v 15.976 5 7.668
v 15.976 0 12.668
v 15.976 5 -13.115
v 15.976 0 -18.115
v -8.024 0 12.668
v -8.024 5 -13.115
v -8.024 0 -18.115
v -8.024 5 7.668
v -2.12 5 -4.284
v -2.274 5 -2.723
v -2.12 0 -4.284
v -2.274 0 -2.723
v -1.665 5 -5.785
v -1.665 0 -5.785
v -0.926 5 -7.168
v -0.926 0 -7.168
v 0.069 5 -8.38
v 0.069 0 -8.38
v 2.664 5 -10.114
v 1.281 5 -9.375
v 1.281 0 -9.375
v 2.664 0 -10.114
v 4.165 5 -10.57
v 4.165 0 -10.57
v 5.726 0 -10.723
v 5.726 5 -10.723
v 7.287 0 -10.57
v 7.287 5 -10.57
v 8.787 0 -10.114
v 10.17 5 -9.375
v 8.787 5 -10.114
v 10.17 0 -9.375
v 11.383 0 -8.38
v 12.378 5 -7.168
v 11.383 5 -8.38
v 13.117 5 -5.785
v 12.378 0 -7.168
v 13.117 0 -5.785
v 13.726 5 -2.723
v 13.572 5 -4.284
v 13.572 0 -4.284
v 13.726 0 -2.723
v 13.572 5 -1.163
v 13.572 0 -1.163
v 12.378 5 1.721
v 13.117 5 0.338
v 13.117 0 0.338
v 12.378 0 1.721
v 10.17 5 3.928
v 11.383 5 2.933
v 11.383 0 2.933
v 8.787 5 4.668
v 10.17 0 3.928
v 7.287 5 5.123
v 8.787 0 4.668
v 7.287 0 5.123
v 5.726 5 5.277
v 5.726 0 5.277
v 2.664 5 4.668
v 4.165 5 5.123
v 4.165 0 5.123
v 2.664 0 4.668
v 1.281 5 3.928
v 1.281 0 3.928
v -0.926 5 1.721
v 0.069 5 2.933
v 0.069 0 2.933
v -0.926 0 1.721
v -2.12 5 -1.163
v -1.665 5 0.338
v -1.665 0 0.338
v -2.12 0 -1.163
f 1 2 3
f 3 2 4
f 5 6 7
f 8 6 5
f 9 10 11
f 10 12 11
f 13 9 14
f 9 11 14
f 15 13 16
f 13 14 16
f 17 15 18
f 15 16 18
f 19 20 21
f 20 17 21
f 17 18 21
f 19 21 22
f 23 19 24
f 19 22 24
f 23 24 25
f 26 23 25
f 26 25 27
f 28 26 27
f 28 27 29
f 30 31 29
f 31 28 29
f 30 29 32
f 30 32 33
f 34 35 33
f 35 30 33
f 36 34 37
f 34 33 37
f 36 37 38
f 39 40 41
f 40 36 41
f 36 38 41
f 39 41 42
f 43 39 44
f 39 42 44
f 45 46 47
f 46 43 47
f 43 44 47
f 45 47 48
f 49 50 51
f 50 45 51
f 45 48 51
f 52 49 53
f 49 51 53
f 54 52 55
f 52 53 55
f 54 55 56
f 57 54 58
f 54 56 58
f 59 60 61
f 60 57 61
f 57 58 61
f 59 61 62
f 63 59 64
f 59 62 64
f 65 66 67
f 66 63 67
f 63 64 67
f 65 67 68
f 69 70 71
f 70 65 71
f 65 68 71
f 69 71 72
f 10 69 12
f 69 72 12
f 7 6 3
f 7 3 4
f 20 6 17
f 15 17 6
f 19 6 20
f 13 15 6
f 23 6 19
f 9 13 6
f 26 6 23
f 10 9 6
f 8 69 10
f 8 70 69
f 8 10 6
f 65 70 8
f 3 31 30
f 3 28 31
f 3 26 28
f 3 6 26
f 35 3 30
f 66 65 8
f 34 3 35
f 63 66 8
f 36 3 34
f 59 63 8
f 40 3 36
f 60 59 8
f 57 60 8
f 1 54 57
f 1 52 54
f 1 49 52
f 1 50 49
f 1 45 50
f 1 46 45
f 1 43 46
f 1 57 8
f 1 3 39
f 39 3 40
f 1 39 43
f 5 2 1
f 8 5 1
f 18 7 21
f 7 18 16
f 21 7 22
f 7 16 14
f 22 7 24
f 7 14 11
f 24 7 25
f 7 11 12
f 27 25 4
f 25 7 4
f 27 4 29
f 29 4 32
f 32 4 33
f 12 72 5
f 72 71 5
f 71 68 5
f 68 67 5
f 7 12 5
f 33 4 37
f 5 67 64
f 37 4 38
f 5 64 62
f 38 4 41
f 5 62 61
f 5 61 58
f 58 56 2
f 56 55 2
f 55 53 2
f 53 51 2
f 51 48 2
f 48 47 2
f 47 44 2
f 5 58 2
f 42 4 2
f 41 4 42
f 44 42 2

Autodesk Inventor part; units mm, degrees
ref_plane "YZ Plane" through (0, 0, 0) normal (1, 0, 0) x (0, 1, 0)
ref_plane "XZ Plane" through (0, 0, 0) normal (0, 1, 0) x (-1, 0, 0)
ref_plane "XY Plane" through (0, 0, 0) normal (0, 0, 1) x (1, 0, 0)
sketch "Sketch1" plane through (0, 0, 0) normal (0, 1, 0) x (-1, 0, 0)
  line L0 (4.5242, 7.5266) -> (-15.9758, 7.5266)
  line L1 (-15.9758, 7.5266) -> (-15.9758, -12.9734)
  line L2 (-15.9758, -12.9734) -> (4.5242, -12.9734)
  line L3 (4.5242, -12.9734) -> (4.5242, 7.5266)
  circle A0 centre (-5.7258, -2.7234) radius 8
  point P0 (0, 0)
  dimension "d0" = 20.5
  dimension "d1" = 20.5
  dimension "d2" = 16
extrude "Extrusion1" add sketch "Sketch1" along normal blind 5
sketch "Sketch2" plane through (-4.5242, 0, -12.9734) normal (-1, 0, 0) x (0, 0, 1)
  line L0 (20.5, 0) -> (25.5, 0)
  line L1 (20.5, 0) -> (20.5, 5) projected
  line L2 (25.5, 0) -> (20.5, 5)
  line L3 (0, 0) -> (-5, 0)
  line L4 (-5, 0) -> (0, 5)
  line L5 (0, 0) -> (0, 5) projected
  line L6 (0, 5) -> (0, 0)
  point P0 (12.9734, 0)
  dimension "d6" = 5
  dimension "d7" = 5
extrude "Extrusion2" add sketch "Sketch2" against normal up to surface (20.5 mm away)
sketch "Sketch3" plane through (15.9758, 0, 12.5266) normal (1, 0, 0) x (0, 0, -1)
  point P0 (12.5266, 0)
sketch "Sketch4" plane through (-4.5242, 0, -17.9734) normal (-1, 0, 0) x (0, 0, 1)
  line L0 (0, 0) -> (30.5, 0) projected
  line L1 (30.5, 0) -> (25.5, 5) projected
  line L2 (5, 5) -> (25.5, 5) projected
  line L3 (5, 5) -> (0, 0) projected
  point P0 (17.9734, 0)
extrude "Extrusion3" add sketch "Sketch4" along normal blind 3.5
sketch "Sketch5" plane through (15.9758, 0, 12.5266) normal (1, 0, 0) x (0, 0, -1)
  line L0 (0, 0) -> (30.5, 0) projected
  line L1 (25.5, 5) -> (30.5, 0) projected
  line L2 (5, 5) -> (25.5, 5) projected
  line L3 (0, 0) -> (5, 5) projected
  line L4 (4.9586, 5.1) -> (25.5414, 5.1)
  line L5 (25.5414, 5.1) -> (30.7414, -0.1)
  line L6 (30.7414, -0.1) -> (-0.2414, -0.1)
  line L7 (-0.2414, -0.1) -> (4.9586, 5.1)
  line L8 (25.5, 5) -> (25.6414, 5)
  line L9 (30.5, 0) -> (30.6414, 0)
  line L10 (0, 0) -> (-0.1414, 0)
  line L11 (5, 5) -> (4.8586, 5)
  point P0 (12.5266, 0)
  dimension "d12" = 0.1
extrude "Extrusion4" add sketch "Sketch5" against normal up to surface (24 mm away) contours L10 L7 L11 L3 | L1 L8 L5 L9
properties part number "bearing_bed_arm2_tight"
